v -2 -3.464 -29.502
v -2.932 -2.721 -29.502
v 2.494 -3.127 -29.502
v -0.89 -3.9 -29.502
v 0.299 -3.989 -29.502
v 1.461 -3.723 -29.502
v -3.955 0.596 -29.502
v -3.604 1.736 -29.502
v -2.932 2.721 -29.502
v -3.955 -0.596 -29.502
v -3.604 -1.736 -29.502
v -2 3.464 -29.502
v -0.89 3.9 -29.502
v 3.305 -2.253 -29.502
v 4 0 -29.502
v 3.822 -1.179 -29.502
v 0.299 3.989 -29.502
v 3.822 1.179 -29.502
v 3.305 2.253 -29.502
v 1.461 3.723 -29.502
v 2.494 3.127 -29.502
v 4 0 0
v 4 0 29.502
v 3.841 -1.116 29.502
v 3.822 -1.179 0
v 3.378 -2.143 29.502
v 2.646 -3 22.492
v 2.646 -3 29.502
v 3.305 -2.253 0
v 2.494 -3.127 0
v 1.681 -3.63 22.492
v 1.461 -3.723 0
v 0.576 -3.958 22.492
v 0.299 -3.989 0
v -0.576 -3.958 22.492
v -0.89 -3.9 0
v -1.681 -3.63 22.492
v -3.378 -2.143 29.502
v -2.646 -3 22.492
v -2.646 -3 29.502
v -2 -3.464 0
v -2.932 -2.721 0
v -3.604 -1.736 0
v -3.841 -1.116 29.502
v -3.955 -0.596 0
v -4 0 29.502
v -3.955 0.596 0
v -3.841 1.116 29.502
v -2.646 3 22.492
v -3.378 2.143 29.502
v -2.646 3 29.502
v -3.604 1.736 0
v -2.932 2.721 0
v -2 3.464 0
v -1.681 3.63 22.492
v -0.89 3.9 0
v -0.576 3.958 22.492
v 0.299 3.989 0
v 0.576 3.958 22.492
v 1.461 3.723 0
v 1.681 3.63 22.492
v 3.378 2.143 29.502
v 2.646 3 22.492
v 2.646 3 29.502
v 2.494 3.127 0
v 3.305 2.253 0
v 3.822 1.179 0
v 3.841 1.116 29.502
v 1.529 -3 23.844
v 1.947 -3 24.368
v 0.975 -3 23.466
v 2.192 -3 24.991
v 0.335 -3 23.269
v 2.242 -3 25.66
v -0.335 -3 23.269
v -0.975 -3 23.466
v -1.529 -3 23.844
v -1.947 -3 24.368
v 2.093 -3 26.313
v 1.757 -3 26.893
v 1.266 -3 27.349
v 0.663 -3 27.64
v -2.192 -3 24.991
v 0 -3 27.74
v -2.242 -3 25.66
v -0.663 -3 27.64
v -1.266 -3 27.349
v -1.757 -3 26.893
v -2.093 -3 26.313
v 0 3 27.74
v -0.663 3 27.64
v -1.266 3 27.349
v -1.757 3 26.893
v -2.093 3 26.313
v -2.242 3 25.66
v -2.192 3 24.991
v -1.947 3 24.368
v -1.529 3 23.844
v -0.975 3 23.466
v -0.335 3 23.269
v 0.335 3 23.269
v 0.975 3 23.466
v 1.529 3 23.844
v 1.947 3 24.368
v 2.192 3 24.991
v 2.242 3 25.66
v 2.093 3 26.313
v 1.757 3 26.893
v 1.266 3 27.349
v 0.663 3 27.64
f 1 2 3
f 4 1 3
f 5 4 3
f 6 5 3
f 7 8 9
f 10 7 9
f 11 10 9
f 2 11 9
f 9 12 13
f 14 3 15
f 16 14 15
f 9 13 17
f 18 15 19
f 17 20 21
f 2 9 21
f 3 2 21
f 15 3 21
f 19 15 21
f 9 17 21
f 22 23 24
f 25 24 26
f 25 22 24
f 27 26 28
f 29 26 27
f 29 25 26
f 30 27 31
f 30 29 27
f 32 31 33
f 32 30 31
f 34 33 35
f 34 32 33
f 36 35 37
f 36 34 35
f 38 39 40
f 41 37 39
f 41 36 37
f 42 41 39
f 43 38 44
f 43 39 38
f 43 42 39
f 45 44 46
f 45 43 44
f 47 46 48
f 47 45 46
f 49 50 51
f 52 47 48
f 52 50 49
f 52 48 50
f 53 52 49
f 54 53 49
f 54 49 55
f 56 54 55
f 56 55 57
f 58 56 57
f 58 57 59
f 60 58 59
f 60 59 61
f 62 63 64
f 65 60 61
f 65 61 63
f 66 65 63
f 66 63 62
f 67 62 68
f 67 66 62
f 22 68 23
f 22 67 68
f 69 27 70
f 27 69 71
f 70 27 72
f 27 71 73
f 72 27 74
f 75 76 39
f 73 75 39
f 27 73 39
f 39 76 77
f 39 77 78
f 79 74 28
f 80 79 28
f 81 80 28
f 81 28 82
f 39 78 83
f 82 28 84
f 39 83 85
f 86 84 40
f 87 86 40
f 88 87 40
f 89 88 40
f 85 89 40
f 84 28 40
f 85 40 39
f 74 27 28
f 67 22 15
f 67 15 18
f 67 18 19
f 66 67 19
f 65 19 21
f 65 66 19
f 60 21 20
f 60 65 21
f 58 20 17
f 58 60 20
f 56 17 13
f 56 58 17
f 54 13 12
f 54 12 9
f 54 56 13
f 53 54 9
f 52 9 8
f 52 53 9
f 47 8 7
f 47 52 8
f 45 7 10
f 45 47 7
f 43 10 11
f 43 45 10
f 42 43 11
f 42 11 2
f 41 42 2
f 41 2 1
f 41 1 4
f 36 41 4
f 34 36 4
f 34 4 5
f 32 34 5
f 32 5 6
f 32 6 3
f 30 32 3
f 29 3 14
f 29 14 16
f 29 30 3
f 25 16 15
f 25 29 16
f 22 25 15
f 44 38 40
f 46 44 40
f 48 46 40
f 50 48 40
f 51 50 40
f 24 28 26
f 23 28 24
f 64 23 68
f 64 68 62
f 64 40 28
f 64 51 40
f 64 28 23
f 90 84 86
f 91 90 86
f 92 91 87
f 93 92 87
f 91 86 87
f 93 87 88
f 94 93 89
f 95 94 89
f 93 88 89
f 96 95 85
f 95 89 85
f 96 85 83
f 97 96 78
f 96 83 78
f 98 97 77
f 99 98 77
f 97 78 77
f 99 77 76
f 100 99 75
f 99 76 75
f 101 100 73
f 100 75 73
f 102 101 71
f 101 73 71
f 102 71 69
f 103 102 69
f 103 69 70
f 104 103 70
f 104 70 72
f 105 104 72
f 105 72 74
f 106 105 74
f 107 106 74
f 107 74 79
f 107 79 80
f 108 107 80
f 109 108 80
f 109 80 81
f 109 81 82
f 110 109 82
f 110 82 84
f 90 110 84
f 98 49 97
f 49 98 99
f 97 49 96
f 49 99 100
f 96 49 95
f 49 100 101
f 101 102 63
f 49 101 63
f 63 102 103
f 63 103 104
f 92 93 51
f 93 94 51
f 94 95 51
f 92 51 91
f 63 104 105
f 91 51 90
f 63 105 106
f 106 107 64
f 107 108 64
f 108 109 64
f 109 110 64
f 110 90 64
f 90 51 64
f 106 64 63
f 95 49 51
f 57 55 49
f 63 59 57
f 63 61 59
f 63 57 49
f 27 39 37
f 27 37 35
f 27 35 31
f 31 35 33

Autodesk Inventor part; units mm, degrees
ref_plane "YZ Plane" through (0, 0, 0) normal (1, 0, 0) x (0, 1, 0)
ref_plane "XZ Plane" through (0, 0, 0) normal (0, 1, 0) x (-1, 0, 0)
ref_plane "XY Plane" through (0, 0, 0) normal (0, 0, 1) x (1, 0, 0)
sketch "Sketch1" plane through (0, 0, 0) normal (0, 0, 1) x (1, 0, 0)
  circle A0 centre (0, 0) radius 4
  dimension "d0" = 8
extrude "Extrusion1" add sketch "Sketch1" along normal mid plane 59.0042
sketch "Sketch2" plane through (0, 0, 29.5021) normal (0, 0, 1) x (1, 0, 0)
  circle A0 centre (0, 0) radius 4 construction
  circle A1 centre (0, 0) radius 4 construction
  line L0 (-2.6458, 3) -> (2.6458, 3)
  line L1 (2.6458, -3) -> (-2.6458, -3)
  line L2 (0, 3) -> (0, -3) construction
  arc A2 (2.6458, 3) -> (-2.6458, 3) centre (0, 0) ccw
  arc A3 (-2.6458, -3) -> (2.6458, -3) centre (0, 0) ccw
  dimension "d3" = 6
extrude "Extrusion2" cut sketch "Sketch2" against normal blind 7.0104
sketch "Sketch3" plane through (-2.6458, 3, 29.5021) normal (0, 1, 0) x (1, 0, 0)
  line L0 (5.2915, 7.0104) -> (0, 7.0104) construction
  point P0 (2.6458, 29.5021)
  point P1 (2.6458, 4.0104)
  point P2 (2.6458, 7.0104)
  dimension "d6" = 3
hole "Hole1" at (0, 3, 25.4917) direction (0, -1, 0) diameter 4.4958 end through all clearance for "Flat Head Machine Screw (82)" size "#8" standard "Ansi Unified Screw Threads"
properties part number "rod" material "Aluminum 6061"
